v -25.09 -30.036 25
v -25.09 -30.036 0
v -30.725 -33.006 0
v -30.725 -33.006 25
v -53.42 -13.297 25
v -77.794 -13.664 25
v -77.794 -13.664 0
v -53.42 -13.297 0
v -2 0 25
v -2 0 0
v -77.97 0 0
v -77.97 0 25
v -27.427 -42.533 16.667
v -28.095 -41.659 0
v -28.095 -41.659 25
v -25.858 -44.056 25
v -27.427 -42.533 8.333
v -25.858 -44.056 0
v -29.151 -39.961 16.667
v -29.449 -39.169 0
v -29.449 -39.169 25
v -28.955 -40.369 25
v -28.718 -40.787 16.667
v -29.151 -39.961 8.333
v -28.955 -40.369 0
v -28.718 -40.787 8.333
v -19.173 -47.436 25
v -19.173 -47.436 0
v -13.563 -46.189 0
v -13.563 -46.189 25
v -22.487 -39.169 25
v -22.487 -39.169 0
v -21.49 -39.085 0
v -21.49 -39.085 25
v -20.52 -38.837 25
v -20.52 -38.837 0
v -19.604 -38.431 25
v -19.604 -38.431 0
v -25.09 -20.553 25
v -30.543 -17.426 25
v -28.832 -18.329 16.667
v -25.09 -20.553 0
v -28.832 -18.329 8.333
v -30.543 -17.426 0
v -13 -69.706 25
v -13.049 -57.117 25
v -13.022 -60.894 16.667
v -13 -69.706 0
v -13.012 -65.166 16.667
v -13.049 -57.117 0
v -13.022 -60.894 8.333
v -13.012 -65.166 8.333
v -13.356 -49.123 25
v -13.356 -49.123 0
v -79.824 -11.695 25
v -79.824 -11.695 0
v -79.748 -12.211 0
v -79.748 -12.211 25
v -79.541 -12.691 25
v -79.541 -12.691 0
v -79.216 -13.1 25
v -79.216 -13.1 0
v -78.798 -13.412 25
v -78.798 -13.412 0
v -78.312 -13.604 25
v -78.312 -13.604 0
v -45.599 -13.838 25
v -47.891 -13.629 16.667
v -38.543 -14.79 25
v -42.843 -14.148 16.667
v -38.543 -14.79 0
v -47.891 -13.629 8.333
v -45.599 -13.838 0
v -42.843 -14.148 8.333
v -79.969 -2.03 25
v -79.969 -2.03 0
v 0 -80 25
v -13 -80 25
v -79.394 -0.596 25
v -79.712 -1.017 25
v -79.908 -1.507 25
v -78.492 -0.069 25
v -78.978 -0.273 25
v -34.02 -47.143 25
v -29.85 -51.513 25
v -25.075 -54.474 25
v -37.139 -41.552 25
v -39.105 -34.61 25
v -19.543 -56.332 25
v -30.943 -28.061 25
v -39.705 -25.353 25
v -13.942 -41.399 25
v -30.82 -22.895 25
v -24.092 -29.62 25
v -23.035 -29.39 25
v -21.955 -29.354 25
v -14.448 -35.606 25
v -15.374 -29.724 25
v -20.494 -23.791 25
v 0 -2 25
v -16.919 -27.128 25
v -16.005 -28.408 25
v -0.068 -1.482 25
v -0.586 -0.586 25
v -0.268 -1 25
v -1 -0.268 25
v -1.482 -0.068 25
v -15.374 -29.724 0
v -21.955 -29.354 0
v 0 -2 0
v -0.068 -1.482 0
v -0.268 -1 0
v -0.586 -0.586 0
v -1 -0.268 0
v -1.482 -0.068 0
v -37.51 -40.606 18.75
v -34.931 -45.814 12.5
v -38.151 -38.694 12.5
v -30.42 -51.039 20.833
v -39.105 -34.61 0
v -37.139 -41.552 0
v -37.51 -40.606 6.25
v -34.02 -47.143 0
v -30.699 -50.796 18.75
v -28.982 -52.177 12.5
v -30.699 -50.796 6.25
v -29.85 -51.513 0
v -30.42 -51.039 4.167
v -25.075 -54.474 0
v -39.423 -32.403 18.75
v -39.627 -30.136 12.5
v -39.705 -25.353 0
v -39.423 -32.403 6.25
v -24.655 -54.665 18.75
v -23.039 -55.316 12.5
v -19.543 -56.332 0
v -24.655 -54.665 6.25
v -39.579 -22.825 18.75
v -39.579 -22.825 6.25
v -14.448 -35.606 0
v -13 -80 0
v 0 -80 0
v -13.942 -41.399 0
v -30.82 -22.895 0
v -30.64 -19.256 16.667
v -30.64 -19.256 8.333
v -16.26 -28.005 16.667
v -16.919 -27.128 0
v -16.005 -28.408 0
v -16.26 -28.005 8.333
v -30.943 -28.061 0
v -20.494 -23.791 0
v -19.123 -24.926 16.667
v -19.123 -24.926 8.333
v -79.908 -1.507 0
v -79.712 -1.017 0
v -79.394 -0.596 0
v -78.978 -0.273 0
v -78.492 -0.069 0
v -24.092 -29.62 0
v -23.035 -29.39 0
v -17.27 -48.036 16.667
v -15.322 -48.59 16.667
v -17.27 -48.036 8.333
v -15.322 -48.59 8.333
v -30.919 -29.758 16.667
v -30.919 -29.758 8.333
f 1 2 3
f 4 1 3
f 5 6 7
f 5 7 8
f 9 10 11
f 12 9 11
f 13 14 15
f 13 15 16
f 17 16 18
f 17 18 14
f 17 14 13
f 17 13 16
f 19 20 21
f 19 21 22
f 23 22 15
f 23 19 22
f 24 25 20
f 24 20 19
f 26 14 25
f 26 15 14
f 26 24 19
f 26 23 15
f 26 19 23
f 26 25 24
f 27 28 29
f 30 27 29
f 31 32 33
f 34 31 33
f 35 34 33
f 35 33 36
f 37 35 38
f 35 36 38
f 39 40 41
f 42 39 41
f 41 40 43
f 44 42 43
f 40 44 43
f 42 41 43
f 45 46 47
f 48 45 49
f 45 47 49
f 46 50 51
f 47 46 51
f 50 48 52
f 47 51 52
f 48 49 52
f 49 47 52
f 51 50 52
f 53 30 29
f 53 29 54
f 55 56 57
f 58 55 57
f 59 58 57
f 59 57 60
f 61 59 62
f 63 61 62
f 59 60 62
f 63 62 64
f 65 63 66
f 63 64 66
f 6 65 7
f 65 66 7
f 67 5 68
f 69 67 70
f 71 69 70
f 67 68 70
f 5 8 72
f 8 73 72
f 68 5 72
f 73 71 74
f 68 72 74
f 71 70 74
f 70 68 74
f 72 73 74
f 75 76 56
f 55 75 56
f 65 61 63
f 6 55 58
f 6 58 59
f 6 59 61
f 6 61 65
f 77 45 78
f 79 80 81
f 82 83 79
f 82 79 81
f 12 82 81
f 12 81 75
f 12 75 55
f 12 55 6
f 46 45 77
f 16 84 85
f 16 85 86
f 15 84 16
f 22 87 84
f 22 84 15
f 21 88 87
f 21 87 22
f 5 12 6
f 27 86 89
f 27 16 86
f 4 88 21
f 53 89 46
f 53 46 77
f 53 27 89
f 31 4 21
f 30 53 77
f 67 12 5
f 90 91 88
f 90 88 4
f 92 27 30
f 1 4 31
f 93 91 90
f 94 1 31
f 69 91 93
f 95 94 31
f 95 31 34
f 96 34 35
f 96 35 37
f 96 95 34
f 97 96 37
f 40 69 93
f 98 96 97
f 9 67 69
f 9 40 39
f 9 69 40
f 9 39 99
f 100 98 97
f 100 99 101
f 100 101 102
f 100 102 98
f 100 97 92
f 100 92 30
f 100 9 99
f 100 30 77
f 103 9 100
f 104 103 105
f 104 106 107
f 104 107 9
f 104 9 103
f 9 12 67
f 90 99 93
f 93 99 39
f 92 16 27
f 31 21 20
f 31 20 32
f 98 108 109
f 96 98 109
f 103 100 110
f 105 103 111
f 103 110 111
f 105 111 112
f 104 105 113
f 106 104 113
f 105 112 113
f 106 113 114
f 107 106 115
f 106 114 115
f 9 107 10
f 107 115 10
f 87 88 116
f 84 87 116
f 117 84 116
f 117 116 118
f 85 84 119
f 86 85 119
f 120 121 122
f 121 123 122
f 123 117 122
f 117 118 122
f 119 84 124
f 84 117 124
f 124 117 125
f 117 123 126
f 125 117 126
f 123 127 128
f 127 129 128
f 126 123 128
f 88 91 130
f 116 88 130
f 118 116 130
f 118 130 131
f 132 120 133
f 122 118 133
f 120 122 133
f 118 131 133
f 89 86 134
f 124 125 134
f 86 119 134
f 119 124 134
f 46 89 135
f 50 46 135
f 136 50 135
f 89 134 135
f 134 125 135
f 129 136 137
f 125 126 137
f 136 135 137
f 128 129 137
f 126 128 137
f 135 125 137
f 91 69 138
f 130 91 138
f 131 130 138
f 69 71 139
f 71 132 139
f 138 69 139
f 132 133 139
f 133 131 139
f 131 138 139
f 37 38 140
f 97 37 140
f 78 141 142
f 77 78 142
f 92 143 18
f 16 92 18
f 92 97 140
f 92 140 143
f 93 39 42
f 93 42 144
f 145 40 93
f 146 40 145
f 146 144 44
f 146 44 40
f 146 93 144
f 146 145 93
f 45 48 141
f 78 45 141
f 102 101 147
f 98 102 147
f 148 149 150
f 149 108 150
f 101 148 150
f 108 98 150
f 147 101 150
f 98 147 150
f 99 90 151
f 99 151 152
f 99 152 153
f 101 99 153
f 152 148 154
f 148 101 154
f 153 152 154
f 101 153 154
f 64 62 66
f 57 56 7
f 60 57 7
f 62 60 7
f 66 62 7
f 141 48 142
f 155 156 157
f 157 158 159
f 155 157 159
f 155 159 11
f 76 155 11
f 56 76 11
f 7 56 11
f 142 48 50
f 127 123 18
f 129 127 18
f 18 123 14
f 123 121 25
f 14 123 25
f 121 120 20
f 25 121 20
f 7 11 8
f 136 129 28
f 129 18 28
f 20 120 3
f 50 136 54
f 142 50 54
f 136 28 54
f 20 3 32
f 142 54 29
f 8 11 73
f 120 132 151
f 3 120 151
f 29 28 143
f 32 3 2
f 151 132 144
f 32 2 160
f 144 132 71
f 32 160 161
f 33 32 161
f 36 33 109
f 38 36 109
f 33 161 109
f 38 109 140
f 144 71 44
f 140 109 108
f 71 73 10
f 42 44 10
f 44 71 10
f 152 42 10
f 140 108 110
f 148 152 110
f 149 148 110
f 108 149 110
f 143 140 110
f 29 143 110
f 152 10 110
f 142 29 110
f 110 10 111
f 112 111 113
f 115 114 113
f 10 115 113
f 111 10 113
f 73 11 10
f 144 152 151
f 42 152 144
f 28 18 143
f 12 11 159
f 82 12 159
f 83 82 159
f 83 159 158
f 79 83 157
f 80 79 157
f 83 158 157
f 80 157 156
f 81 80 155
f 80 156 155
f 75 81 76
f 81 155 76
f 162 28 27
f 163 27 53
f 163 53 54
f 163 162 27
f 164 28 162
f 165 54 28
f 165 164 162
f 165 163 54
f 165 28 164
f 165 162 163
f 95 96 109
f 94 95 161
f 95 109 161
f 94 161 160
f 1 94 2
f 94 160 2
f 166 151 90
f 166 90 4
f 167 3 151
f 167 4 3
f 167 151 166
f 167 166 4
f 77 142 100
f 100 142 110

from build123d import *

# Parameters (mm, degrees)
F1_DEPTH = 25
F3_DEPTH = 25


with BuildPart() as f1:
    # F0 (on Top) → F1 (new body)
    with BuildSketch(Plane.XY):
        with BuildLine():
            Line((0, -80), (0, -2))
            ThreePointArc((0, -2), (-0.5857864376, -0.5857864376), (-2, 0))
            Line((-2, 0), (-77.9695956579, 0))
            ThreePointArc((-77.9695956579, 0), (-79.3944371446, -0.5964948388), (-79.9693680385, -2.0301732624))
            Line((-79.9693680385, -2.0301732624), (-79.8235436371, -11.6948759406))
            ThreePointArc((-79.8235436371, -11.6948759406), (-79.2164881491, -13.1000910078), (-77.793597994, -13.6644750587))
            Line((-77.793597994, -13.6644750587), (-53.4198508516, -13.2967154695))
            add(Edge.make_bspline(
                [(-53.4198508516, -13.2967154695), (-47.7391326457, -13.5155175895), (-42.3810972533, -14.1065922457), (-38.542901615, -14.7899318492)],
                knots=[0, 0, 0, 0, 0.162253053, 0.162253053, 0.162253053, 0.162253053], degree=3))
            add(Edge.make_bspline(
                [(-38.542901615, -14.7899318492), (-35.6620781643, -15.3028240882), (-33.637457964, -15.8676938778), (-30.542901615, -17.425809837)],
                knots=[0.162253053, 0.162253053, 0.162253053, 0.162253053, 0.28403486, 0.28403486, 0.28403486, 0.28403486], degree=3))
            add(Edge.make_bspline(
                [(-30.542901615, -17.425809837), (-26.1822221976, -19.6214215586), (-19.6969808737, -23.7893126338), (-16.9190281723, -27.1281322878)],
                knots=[0.28403486, 0.28403486, 0.28403486, 0.28403486, 0.4556431162, 0.4556431162, 0.4556431162, 0.4556431162], degree=3))
            add(Edge.make_bspline(
                [(-16.9190281723, -27.1281322878), (-15.0709363906, -29.3493526709), (-14.8636375386, -31.2036378987), (-14.5838867171, -34.1526714679)],
                knots=[0.4556431162, 0.4556431162, 0.4556431162, 0.4556431162, 0.5698091378, 0.5698091378, 0.5698091378, 0.5698091378], degree=3))
            add(Edge.make_bspline(
                [(-14.5838867171, -34.1526714679), (-14.185393399, -38.3534461651), (-13.6398891789, -44.7755537277), (-13.3562185193, -49.1226911473)],
                knots=[0.5698091378, 0.5698091378, 0.5698091378, 0.5698091378, 0.7324338497, 0.7324338497, 0.7324338497, 0.7324338497], degree=3))
            add(Edge.make_bspline(
                [(-13.3562185193, -49.1226911473), (-13.1491946262, -52.2952480614), (-13.0816268013, -54.3626480299), (-13.0485558451, -57.1167729382)],
                knots=[0.7324338497, 0.7324338497, 0.7324338497, 0.7324338497, 0.851117964, 0.851117964, 0.851117964, 0.851117964], degree=3))
            add(Edge.make_bspline(
                [(-13.0485558451, -57.1167729382), (-13.0070703326, -60.5716558966), (-13.0198697257, -65.1071818251), (-13, -69.7056261365)],
                knots=[0.851117964, 0.851117964, 0.851117964, 0.851117964, 1, 1, 1, 1], degree=3))
            Line((-13, -69.7056261365), (-13, -80))
            Line((-13, -80), (0, -80))
        make_face()
        with BuildLine():
            add(Edge.make_bspline(
                [(-38.542901615, -14.7899318492), (-40.9139160013, -27.8005372261), (-38.6884407603, -47.6270350351), (-23.5400479968, -56.7981427702), (-13.0485558451, -57.1167729382)],
                knots=[0, 0, 0, 0, 0.5296598009, 1, 1, 1, 1], degree=3))
            Line((-13.0485558451, -57.1167729382), (-13.3562185193, -49.1226911473))
            add(Edge.make_bspline(
                [(-28.0948624921, -41.658554015), (-25.10242463, -46.0305335019), (-19.1761098596, -47.5514449335), (-13.3562185193, -49.1226911473)],
                knots=[0.5483675118, 0.5483675118, 0.5483675118, 0.5483675118, 1, 1, 1, 1], degree=3))
            add(Edge.make_bspline(
                [(-29.6557347838, -38.4299094695), (-29.4003822649, -39.4415698152), (-29.0648385357, -40.4727694453), (-28.0948624921, -41.658554015)],
                knots=[2.4430203601, 2.4430203601, 2.4430203601, 2.4430203601, 5.8501597635, 5.8501597635, 5.8501597635, 5.8501597635], degree=3))
            add(Edge.make_bspline(
                [(-30.1900775171, -36.4835122599), (-30.0399059836, -37.1596607946), (-29.863001925, -37.8096107603), (-29.6557347838, -38.4299094695)],
                knots=[0.399285872, 0.399285872, 0.399285872, 0.399285872, 0.4502459731, 0.4502459731, 0.4502459731, 0.4502459731], degree=3))
            add(Edge.make_bspline(
                [(-30.2856540448, -36.0319675746), (-30.2550717037, -36.1837342297), (-30.2232258771, -36.334261503), (-30.1900775171, -36.4835122599)],
                knots=[0.3880371104, 0.3880371104, 0.3880371104, 0.3880371104, 0.399285872, 0.399285872, 0.399285872, 0.399285872], degree=3))
            add(Edge.make_bspline(
                [(-30.542901615, -17.425809837), (-30.892076359, -24.086456269), (-31.3406220256, -30.7966273139), (-30.2856540448, -36.0319675746)],
                knots=[0, 0, 0, 0, 0.3880371104, 0.3880371104, 0.3880371104, 0.3880371104], degree=3))
            add(Edge.make_bspline(
                [(-38.542901615, -14.7899318492), (-35.6620781643, -15.3028240882), (-33.637457964, -15.8676938778), (-30.542901615, -17.425809837)],
                knots=[0.162253053, 0.162253053, 0.162253053, 0.162253053, 0.28403486, 0.28403486, 0.28403486, 0.28403486], degree=3))
        make_face()
        with BuildLine():
            Line((-13.3562185193, -49.1226911473), (-13.0485558451, -57.1167729382))
            add(Edge.make_bspline(
                [(-13.3562185193, -49.1226911473), (-13.1491946262, -52.2952480614), (-13.0816268013, -54.3626480299), (-13.0485558451, -57.1167729382)],
                knots=[0.7324338497, 0.7324338497, 0.7324338497, 0.7324338497, 0.851117964, 0.851117964, 0.851117964, 0.851117964], degree=3))
        make_face()
    extrude(amount=F1_DEPTH)

    # F2 (on Top) → F3 (join)
    with BuildSketch(Plane.XY):
        with BuildLine():
            Line((-25.0898172111, -30.0360443188), (-32.0051051676, -33.6804613471))
            Line((-32.0051051676, -33.6804613471), (-30.857918683, -39.1688235104))
            Line((-30.857918683, -39.1688235104), (-22.4874541369, -39.1688235104))
            ThreePointArc((-22.4874541369, -39.1688235104), (-20.9994273294, -38.981376841), (-19.6043757451, -38.4307489172))
            Line((-19.6043757451, -38.4307489172), (-12.428862974, -34.4991907477))
            Line((-12.428862974, -34.4991907477), (-13.2681293624, -29.8431319511))
            Line((-13.2681293624, -29.8431319511), (-21.9548307901, -29.3535438949))
            ThreePointArc((-21.9548307901, -29.3535438949), (-23.5687895254, -29.4813601163), (-25.0898172111, -30.0360443188))
        make_face()
        Polygon((-19.8781598252, -23.5392715438), (-23.3667287976, -19.8491029441), (-32.8251793981, -23.714505136), (-31.0336794844, -28.0982180313), align=None)
        Polygon((-11.7061119527, -40.9006923437), (-26.9871223718, -44.3079471588), (-25.5416221917, -48.8509498537), (-9.744361043, -45.3404448926), align=None)
    extrude(amount=F3_DEPTH)


solid = f1.part
